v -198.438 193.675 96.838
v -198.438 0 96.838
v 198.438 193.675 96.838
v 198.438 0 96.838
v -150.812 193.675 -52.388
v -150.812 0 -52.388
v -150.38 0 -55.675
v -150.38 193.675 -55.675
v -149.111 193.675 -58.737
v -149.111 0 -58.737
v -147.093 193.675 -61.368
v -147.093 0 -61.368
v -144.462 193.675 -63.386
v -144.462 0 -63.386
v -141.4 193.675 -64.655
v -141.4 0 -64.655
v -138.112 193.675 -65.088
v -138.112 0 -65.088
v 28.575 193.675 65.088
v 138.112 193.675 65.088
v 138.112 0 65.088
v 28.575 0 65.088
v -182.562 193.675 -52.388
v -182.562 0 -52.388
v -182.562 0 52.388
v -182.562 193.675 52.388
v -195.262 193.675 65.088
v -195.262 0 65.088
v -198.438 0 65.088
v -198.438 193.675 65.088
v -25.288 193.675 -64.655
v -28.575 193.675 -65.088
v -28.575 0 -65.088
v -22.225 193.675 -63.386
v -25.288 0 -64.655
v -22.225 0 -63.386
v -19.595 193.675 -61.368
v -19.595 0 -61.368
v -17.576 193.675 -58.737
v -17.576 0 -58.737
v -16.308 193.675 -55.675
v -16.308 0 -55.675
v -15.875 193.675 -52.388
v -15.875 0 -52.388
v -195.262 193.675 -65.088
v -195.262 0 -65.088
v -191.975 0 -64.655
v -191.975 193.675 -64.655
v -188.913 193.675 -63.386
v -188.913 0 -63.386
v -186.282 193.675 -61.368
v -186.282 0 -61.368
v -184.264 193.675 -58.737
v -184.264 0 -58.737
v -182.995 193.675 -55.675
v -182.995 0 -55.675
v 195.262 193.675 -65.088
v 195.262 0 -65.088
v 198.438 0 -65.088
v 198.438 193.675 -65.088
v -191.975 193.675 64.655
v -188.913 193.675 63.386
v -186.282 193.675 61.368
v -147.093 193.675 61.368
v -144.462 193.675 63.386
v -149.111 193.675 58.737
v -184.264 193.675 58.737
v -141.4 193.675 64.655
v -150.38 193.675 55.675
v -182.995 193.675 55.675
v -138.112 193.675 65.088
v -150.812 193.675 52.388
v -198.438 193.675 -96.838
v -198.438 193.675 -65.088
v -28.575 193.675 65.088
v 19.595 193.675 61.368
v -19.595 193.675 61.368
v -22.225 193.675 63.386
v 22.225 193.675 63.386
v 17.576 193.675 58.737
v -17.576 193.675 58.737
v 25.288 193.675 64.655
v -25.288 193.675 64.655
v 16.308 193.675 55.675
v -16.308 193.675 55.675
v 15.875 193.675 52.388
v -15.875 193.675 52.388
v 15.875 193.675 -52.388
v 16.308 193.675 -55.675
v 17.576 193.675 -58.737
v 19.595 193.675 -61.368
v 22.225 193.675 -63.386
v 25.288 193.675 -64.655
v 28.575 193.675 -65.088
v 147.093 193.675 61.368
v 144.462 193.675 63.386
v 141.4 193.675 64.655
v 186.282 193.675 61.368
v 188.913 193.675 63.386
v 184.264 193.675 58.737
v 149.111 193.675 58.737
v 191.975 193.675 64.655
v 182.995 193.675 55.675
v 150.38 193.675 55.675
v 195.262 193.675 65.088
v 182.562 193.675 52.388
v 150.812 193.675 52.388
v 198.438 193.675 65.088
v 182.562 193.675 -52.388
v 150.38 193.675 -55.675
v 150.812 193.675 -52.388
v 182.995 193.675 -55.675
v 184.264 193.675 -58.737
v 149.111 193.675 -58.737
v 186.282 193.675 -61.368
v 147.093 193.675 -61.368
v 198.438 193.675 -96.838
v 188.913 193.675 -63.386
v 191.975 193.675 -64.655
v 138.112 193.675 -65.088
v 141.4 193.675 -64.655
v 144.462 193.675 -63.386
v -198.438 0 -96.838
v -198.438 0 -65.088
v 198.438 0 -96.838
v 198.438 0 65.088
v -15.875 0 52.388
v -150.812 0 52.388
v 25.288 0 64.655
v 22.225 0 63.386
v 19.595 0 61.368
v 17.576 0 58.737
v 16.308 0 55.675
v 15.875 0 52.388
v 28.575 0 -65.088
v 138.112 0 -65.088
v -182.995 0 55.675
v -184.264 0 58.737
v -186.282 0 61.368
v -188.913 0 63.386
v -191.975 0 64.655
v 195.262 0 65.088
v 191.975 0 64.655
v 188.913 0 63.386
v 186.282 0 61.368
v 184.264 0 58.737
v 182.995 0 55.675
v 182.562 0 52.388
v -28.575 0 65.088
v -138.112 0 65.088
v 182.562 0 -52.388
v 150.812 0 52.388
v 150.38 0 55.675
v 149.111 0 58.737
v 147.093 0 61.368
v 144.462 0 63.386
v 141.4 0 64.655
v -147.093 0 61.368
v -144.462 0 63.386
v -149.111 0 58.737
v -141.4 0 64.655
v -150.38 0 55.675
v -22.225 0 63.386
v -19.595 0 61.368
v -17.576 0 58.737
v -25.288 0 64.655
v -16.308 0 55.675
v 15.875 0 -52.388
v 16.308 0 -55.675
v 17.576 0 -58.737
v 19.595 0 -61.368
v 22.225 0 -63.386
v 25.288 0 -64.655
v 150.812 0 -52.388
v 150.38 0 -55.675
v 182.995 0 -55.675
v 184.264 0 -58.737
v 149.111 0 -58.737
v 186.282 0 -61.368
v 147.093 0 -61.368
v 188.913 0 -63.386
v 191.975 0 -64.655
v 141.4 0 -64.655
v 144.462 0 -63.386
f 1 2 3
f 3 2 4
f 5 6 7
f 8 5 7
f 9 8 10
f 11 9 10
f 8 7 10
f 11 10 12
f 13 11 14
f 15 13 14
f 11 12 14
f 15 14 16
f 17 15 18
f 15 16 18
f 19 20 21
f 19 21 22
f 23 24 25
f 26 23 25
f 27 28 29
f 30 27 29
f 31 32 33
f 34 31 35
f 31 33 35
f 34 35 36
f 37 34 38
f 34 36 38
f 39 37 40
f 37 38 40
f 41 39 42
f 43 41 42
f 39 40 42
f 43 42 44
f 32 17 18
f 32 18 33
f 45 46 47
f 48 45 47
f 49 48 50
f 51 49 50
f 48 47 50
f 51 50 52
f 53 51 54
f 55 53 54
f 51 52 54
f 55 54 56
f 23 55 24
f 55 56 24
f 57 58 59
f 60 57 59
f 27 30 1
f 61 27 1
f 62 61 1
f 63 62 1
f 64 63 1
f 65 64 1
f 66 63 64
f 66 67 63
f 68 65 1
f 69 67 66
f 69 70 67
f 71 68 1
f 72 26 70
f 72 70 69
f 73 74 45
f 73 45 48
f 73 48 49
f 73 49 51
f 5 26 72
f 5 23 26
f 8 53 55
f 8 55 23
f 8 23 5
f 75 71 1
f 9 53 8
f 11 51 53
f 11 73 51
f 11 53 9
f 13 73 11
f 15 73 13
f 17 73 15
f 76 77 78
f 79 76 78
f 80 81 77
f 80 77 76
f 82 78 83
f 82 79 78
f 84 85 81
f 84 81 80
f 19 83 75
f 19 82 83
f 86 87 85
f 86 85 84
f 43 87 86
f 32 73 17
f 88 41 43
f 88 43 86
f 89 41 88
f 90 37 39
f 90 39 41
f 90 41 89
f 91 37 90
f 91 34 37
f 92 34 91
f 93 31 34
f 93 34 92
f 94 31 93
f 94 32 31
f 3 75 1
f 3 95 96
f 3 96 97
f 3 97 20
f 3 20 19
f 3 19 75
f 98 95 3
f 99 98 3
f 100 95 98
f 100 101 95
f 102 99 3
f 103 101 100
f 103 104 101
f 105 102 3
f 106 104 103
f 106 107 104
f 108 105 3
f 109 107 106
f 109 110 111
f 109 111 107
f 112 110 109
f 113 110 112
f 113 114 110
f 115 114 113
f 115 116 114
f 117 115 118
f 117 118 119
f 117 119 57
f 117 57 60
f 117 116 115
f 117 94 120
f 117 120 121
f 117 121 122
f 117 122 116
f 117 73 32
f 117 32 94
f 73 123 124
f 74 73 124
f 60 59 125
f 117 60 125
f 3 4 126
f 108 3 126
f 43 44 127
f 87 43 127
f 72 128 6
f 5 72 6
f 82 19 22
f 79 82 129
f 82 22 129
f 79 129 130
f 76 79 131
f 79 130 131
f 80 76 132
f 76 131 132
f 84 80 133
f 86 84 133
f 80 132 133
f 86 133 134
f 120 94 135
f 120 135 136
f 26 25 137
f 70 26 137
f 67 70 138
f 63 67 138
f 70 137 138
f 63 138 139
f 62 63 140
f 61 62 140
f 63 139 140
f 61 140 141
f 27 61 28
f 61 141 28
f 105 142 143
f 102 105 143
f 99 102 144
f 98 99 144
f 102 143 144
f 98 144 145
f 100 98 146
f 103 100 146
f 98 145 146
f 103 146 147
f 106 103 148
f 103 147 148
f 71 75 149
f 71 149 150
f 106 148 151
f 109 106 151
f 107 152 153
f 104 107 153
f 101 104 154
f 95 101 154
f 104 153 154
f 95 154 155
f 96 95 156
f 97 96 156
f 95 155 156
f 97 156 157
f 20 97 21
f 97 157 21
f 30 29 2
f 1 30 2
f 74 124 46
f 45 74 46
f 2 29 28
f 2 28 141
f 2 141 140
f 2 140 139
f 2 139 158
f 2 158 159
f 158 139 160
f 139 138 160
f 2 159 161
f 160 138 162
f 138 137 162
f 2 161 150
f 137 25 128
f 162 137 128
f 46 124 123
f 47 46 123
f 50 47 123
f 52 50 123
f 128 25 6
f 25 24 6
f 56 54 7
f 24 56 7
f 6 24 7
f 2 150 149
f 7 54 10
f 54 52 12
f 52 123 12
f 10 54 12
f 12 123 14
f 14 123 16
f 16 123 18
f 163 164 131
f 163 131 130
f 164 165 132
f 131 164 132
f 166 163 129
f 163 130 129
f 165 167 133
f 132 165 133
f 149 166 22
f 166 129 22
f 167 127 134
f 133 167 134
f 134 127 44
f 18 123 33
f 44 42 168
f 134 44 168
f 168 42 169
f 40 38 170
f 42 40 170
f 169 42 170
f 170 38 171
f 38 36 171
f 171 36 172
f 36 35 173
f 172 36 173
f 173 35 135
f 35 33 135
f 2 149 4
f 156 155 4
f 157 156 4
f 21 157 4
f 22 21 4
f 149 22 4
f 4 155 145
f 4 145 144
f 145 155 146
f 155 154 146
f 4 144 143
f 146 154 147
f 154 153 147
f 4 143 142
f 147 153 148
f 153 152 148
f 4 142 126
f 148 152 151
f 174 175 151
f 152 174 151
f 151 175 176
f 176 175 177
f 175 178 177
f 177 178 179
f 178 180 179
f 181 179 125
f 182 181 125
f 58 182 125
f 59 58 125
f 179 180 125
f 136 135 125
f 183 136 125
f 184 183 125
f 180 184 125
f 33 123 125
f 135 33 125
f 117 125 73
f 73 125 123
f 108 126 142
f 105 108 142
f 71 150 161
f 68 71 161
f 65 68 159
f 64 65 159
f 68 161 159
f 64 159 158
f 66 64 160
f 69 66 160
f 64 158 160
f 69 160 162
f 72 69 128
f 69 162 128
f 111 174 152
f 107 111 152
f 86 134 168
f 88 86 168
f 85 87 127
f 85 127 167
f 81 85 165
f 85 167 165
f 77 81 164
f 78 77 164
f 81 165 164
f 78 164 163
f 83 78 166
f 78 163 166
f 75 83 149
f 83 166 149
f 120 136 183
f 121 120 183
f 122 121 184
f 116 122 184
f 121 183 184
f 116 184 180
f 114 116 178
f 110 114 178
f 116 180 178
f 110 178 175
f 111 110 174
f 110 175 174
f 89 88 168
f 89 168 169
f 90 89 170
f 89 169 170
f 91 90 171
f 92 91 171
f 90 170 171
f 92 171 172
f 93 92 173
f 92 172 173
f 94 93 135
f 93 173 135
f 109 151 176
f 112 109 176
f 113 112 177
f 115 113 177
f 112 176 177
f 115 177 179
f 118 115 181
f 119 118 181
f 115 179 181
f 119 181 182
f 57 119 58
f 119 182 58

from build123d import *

# Parameters (mm, degrees)
EXTRUDE1_DEPTH = 193.675


with BuildPart() as part:
    # Sketch1 → Extrude1 (new body)
    with BuildSketch(Plane(origin=(0, 0, 0), x_dir=(1, 0, 0), z_dir=(0, 1, 0))):
        with BuildLine():
            Line((-198.4375, 65.0875), (-195.2625, 65.0875))
            ThreePointArc((-195.2625, 65.0875), (-186.282243879, 61.367756121), (-182.5625, 52.3875))
            Line((-182.5625, 52.3875), (-182.5625, -52.3875))
            ThreePointArc((-182.5625, -52.3875), (-186.282243879, -61.367756121), (-195.2625, -65.0875))
            Line((-195.2625, -65.0875), (-198.4375, -65.0875))
            Line((-198.4375, -65.0875), (-198.4375, -96.8375))
            Line((-198.4375, -96.8375), (198.4375, -96.8375))
            Line((198.4375, -96.8375), (198.4375, -65.0875))
            Line((198.4375, -65.0875), (195.2625, -65.0875))
            ThreePointArc((195.2625, -65.0875), (186.282243879, -61.367756121), (182.5625, -52.3875))
            Line((182.5625, -52.3875), (182.5625, 52.3875))
            ThreePointArc((182.5625, 52.3875), (186.282243879, 61.367756121), (195.2625, 65.0875))
            Line((195.2625, 65.0875), (198.4375, 65.0875))
            Line((198.4375, 65.0875), (198.4375, 96.8375))
            Line((198.4375, 96.8375), (-198.4375, 96.8375))
            Line((-198.4375, 96.8375), (-198.4375, 65.0875))
        make_face()
        with BuildLine():
            Line((-28.575, -65.0875), (-138.1125, -65.0875))
            ThreePointArc((-138.1125, -65.0875), (-147.092756121, -61.367756121), (-150.8125, -52.3875))
            Line((-150.8125, -52.3875), (-150.8125, 52.3875))
            ThreePointArc((-150.8125, 52.3875), (-147.092756121, 61.367756121), (-138.1125, 65.0875))
            Line((-138.1125, 65.0875), (-28.575, 65.0875))
            ThreePointArc((-28.575, 65.0875), (-19.594743879, 61.367756121), (-15.875, 52.3875))
            Line((-15.875, 52.3875), (-15.875, -52.3875))
            ThreePointArc((-15.875, -52.3875), (-19.594743879, -61.367756121), (-28.575, -65.0875))
        make_face(mode=Mode.SUBTRACT)
        with BuildLine():
            Line((138.1125, -65.0875), (28.575, -65.0875))
            ThreePointArc((28.575, -65.0875), (19.594743879, -61.367756121), (15.875, -52.3875))
            Line((15.875, -52.3875), (15.875, 52.3875))
            ThreePointArc((15.875, 52.3875), (19.594743879, 61.367756121), (28.575, 65.0875))
            Line((28.575, 65.0875), (138.1125, 65.0875))
            ThreePointArc((138.1125, 65.0875), (147.092756121, 61.367756121), (150.8125, 52.3875))
            Line((150.8125, 52.3875), (150.8125, -52.3875))
            ThreePointArc((150.8125, -52.3875), (147.092756121, -61.367756121), (138.1125, -65.0875))
        make_face(mode=Mode.SUBTRACT)
    extrude(amount=EXTRUDE1_DEPTH)


solid = part.part
